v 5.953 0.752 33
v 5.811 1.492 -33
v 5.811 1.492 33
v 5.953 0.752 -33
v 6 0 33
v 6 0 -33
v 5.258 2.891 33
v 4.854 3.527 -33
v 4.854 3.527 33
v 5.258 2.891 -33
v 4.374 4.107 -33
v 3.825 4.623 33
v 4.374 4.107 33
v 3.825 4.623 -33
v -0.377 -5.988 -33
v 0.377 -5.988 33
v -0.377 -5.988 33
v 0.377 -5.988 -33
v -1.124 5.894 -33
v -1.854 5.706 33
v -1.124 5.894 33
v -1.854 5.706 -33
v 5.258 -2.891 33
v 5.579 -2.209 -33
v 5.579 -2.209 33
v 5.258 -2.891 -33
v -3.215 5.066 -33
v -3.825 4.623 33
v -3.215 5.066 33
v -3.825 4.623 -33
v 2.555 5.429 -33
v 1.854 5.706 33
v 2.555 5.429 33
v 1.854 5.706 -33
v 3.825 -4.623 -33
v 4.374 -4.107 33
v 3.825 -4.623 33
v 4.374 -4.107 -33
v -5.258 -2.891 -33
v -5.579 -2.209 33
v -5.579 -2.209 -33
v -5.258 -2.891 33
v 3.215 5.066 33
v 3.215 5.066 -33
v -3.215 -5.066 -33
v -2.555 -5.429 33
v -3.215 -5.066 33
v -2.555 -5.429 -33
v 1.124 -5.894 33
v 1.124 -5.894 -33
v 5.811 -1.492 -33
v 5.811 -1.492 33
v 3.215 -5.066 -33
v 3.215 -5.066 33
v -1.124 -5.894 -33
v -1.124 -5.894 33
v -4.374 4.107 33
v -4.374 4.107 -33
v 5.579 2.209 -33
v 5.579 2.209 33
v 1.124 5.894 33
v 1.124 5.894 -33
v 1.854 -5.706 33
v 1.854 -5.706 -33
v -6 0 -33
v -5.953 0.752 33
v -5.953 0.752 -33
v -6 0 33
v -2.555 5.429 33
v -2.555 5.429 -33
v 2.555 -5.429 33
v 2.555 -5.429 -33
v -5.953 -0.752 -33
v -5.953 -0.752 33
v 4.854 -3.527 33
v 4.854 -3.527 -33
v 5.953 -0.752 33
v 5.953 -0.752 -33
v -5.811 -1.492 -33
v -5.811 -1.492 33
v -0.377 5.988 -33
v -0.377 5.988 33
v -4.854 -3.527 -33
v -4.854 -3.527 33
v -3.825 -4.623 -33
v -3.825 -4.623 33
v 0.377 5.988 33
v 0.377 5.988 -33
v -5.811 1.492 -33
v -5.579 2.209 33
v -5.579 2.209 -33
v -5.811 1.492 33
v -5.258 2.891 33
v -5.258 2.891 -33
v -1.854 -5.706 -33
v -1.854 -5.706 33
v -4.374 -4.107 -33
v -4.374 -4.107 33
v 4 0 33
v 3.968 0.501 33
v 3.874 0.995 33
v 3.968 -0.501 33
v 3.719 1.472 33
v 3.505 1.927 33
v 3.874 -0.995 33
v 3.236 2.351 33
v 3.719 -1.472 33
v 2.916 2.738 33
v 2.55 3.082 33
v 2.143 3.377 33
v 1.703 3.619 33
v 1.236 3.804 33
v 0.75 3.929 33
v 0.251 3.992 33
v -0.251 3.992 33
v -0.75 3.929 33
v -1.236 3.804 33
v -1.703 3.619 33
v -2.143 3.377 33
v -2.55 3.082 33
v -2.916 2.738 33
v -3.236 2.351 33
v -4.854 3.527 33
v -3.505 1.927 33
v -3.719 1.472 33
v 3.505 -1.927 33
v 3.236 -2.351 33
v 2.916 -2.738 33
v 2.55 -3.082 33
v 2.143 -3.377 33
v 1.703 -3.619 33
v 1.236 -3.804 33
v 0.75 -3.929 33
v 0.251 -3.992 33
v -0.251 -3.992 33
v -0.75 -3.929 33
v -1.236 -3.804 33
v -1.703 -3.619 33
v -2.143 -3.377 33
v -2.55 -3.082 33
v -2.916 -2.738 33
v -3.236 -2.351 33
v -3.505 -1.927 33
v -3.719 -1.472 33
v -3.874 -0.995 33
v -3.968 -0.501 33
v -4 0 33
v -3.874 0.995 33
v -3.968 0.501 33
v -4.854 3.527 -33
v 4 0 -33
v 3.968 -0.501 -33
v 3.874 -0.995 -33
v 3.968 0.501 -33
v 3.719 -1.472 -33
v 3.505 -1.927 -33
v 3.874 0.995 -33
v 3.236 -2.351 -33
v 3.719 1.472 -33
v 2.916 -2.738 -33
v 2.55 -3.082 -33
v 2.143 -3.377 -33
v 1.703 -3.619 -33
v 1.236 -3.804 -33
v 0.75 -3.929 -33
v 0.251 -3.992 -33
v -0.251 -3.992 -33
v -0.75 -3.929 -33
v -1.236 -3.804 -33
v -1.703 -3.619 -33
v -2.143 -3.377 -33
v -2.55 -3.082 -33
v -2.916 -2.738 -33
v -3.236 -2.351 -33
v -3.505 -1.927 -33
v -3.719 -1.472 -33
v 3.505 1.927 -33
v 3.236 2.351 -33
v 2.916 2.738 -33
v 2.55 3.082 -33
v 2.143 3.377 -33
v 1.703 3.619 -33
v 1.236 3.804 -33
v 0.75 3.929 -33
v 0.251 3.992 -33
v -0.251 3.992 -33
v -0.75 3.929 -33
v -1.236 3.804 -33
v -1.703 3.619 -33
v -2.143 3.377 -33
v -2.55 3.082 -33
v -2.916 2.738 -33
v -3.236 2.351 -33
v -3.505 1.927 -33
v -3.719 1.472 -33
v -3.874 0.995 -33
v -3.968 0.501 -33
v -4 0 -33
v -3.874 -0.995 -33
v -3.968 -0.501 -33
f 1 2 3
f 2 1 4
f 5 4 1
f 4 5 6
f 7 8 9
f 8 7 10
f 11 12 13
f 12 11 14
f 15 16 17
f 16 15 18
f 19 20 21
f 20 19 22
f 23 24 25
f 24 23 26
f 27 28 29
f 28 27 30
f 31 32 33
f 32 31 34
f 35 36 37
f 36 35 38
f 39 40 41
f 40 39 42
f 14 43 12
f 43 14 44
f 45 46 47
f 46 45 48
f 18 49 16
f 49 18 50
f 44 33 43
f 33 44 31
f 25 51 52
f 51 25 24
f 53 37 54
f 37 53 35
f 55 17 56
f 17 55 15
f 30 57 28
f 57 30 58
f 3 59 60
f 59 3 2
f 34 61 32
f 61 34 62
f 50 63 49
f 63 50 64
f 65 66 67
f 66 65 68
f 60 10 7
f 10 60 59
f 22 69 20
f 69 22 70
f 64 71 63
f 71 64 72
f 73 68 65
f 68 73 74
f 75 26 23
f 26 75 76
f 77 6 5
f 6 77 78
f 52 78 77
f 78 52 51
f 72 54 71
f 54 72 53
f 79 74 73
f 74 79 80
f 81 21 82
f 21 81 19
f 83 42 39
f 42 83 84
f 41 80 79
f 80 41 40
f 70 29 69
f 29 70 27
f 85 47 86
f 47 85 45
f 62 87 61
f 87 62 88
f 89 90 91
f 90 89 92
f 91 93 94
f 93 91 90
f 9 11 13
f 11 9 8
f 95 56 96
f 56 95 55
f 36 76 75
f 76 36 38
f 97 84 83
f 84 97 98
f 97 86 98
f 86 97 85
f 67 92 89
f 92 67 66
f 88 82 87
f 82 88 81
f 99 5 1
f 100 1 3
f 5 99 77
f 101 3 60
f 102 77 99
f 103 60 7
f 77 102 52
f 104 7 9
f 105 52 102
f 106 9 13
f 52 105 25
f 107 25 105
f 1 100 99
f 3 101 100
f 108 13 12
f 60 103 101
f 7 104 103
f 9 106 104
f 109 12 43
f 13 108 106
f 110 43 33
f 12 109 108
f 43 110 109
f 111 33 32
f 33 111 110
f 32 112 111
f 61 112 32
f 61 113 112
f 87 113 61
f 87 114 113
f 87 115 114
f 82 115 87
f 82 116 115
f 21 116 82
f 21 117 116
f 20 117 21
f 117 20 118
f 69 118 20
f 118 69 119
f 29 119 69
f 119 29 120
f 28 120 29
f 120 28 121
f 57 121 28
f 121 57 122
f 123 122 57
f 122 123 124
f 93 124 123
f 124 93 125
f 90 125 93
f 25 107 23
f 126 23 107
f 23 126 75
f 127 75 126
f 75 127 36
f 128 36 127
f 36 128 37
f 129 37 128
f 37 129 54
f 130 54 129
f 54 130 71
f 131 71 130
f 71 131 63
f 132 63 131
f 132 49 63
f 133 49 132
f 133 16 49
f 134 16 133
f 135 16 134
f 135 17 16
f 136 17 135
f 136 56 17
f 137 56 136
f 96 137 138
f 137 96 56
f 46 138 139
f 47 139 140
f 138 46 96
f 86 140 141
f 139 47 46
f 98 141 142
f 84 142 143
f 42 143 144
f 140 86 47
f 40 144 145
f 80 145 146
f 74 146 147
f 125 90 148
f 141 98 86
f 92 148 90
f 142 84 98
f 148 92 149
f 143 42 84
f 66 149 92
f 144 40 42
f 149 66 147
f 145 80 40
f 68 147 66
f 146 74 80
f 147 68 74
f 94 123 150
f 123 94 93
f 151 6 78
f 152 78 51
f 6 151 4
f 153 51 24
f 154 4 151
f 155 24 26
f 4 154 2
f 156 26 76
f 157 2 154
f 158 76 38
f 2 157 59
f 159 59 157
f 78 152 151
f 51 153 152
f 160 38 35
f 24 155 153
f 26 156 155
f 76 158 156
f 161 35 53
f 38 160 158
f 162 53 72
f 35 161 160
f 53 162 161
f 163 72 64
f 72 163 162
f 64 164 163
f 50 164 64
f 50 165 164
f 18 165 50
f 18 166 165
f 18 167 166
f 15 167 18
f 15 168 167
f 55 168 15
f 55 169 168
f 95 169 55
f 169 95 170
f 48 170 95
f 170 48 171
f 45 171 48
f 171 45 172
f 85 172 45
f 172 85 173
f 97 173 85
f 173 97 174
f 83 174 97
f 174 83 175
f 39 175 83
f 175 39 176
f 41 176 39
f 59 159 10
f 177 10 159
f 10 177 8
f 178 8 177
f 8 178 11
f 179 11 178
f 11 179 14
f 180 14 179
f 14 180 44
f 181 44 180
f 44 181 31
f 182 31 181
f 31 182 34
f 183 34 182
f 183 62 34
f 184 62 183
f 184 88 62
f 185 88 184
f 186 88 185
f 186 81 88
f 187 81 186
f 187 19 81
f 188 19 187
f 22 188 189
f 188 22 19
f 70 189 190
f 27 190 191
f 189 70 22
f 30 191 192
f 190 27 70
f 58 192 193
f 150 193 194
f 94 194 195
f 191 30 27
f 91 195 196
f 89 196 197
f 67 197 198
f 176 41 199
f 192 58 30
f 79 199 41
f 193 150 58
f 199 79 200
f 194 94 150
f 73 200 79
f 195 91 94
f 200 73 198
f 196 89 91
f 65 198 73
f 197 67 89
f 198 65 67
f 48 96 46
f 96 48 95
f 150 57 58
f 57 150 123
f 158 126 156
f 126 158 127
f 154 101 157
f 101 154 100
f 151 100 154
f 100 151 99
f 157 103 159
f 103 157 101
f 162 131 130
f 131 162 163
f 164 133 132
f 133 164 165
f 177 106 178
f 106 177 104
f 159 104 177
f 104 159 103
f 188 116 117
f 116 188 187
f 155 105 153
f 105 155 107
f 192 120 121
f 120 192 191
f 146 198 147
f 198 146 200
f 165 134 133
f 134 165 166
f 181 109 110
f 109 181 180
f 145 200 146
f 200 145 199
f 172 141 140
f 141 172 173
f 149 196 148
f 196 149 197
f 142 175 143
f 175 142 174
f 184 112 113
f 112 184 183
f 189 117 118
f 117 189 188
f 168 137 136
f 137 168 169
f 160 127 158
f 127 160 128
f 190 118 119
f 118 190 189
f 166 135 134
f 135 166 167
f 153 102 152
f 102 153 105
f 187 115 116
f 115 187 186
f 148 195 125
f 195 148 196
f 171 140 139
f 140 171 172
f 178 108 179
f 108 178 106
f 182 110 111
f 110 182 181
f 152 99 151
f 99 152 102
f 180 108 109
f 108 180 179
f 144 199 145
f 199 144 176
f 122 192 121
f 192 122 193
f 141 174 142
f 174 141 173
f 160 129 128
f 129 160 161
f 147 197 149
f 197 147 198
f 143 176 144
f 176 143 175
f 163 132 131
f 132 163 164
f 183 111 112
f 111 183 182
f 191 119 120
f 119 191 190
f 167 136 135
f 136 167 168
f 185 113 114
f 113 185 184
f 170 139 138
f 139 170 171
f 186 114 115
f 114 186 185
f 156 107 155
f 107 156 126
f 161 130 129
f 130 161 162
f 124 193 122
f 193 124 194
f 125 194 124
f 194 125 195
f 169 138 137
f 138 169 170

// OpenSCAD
$fn = 50;


difference() {
	union() {
		translate(v = [0, 0, -33.0000000000]) {
			cylinder(h = 66, r = 6.0000000000);
		}
	}
	union() {
		translate(v = [0, 0, -100.0000000000]) {
			cylinder(h = 200, r = 4.0000000000);
		}
	}
}
